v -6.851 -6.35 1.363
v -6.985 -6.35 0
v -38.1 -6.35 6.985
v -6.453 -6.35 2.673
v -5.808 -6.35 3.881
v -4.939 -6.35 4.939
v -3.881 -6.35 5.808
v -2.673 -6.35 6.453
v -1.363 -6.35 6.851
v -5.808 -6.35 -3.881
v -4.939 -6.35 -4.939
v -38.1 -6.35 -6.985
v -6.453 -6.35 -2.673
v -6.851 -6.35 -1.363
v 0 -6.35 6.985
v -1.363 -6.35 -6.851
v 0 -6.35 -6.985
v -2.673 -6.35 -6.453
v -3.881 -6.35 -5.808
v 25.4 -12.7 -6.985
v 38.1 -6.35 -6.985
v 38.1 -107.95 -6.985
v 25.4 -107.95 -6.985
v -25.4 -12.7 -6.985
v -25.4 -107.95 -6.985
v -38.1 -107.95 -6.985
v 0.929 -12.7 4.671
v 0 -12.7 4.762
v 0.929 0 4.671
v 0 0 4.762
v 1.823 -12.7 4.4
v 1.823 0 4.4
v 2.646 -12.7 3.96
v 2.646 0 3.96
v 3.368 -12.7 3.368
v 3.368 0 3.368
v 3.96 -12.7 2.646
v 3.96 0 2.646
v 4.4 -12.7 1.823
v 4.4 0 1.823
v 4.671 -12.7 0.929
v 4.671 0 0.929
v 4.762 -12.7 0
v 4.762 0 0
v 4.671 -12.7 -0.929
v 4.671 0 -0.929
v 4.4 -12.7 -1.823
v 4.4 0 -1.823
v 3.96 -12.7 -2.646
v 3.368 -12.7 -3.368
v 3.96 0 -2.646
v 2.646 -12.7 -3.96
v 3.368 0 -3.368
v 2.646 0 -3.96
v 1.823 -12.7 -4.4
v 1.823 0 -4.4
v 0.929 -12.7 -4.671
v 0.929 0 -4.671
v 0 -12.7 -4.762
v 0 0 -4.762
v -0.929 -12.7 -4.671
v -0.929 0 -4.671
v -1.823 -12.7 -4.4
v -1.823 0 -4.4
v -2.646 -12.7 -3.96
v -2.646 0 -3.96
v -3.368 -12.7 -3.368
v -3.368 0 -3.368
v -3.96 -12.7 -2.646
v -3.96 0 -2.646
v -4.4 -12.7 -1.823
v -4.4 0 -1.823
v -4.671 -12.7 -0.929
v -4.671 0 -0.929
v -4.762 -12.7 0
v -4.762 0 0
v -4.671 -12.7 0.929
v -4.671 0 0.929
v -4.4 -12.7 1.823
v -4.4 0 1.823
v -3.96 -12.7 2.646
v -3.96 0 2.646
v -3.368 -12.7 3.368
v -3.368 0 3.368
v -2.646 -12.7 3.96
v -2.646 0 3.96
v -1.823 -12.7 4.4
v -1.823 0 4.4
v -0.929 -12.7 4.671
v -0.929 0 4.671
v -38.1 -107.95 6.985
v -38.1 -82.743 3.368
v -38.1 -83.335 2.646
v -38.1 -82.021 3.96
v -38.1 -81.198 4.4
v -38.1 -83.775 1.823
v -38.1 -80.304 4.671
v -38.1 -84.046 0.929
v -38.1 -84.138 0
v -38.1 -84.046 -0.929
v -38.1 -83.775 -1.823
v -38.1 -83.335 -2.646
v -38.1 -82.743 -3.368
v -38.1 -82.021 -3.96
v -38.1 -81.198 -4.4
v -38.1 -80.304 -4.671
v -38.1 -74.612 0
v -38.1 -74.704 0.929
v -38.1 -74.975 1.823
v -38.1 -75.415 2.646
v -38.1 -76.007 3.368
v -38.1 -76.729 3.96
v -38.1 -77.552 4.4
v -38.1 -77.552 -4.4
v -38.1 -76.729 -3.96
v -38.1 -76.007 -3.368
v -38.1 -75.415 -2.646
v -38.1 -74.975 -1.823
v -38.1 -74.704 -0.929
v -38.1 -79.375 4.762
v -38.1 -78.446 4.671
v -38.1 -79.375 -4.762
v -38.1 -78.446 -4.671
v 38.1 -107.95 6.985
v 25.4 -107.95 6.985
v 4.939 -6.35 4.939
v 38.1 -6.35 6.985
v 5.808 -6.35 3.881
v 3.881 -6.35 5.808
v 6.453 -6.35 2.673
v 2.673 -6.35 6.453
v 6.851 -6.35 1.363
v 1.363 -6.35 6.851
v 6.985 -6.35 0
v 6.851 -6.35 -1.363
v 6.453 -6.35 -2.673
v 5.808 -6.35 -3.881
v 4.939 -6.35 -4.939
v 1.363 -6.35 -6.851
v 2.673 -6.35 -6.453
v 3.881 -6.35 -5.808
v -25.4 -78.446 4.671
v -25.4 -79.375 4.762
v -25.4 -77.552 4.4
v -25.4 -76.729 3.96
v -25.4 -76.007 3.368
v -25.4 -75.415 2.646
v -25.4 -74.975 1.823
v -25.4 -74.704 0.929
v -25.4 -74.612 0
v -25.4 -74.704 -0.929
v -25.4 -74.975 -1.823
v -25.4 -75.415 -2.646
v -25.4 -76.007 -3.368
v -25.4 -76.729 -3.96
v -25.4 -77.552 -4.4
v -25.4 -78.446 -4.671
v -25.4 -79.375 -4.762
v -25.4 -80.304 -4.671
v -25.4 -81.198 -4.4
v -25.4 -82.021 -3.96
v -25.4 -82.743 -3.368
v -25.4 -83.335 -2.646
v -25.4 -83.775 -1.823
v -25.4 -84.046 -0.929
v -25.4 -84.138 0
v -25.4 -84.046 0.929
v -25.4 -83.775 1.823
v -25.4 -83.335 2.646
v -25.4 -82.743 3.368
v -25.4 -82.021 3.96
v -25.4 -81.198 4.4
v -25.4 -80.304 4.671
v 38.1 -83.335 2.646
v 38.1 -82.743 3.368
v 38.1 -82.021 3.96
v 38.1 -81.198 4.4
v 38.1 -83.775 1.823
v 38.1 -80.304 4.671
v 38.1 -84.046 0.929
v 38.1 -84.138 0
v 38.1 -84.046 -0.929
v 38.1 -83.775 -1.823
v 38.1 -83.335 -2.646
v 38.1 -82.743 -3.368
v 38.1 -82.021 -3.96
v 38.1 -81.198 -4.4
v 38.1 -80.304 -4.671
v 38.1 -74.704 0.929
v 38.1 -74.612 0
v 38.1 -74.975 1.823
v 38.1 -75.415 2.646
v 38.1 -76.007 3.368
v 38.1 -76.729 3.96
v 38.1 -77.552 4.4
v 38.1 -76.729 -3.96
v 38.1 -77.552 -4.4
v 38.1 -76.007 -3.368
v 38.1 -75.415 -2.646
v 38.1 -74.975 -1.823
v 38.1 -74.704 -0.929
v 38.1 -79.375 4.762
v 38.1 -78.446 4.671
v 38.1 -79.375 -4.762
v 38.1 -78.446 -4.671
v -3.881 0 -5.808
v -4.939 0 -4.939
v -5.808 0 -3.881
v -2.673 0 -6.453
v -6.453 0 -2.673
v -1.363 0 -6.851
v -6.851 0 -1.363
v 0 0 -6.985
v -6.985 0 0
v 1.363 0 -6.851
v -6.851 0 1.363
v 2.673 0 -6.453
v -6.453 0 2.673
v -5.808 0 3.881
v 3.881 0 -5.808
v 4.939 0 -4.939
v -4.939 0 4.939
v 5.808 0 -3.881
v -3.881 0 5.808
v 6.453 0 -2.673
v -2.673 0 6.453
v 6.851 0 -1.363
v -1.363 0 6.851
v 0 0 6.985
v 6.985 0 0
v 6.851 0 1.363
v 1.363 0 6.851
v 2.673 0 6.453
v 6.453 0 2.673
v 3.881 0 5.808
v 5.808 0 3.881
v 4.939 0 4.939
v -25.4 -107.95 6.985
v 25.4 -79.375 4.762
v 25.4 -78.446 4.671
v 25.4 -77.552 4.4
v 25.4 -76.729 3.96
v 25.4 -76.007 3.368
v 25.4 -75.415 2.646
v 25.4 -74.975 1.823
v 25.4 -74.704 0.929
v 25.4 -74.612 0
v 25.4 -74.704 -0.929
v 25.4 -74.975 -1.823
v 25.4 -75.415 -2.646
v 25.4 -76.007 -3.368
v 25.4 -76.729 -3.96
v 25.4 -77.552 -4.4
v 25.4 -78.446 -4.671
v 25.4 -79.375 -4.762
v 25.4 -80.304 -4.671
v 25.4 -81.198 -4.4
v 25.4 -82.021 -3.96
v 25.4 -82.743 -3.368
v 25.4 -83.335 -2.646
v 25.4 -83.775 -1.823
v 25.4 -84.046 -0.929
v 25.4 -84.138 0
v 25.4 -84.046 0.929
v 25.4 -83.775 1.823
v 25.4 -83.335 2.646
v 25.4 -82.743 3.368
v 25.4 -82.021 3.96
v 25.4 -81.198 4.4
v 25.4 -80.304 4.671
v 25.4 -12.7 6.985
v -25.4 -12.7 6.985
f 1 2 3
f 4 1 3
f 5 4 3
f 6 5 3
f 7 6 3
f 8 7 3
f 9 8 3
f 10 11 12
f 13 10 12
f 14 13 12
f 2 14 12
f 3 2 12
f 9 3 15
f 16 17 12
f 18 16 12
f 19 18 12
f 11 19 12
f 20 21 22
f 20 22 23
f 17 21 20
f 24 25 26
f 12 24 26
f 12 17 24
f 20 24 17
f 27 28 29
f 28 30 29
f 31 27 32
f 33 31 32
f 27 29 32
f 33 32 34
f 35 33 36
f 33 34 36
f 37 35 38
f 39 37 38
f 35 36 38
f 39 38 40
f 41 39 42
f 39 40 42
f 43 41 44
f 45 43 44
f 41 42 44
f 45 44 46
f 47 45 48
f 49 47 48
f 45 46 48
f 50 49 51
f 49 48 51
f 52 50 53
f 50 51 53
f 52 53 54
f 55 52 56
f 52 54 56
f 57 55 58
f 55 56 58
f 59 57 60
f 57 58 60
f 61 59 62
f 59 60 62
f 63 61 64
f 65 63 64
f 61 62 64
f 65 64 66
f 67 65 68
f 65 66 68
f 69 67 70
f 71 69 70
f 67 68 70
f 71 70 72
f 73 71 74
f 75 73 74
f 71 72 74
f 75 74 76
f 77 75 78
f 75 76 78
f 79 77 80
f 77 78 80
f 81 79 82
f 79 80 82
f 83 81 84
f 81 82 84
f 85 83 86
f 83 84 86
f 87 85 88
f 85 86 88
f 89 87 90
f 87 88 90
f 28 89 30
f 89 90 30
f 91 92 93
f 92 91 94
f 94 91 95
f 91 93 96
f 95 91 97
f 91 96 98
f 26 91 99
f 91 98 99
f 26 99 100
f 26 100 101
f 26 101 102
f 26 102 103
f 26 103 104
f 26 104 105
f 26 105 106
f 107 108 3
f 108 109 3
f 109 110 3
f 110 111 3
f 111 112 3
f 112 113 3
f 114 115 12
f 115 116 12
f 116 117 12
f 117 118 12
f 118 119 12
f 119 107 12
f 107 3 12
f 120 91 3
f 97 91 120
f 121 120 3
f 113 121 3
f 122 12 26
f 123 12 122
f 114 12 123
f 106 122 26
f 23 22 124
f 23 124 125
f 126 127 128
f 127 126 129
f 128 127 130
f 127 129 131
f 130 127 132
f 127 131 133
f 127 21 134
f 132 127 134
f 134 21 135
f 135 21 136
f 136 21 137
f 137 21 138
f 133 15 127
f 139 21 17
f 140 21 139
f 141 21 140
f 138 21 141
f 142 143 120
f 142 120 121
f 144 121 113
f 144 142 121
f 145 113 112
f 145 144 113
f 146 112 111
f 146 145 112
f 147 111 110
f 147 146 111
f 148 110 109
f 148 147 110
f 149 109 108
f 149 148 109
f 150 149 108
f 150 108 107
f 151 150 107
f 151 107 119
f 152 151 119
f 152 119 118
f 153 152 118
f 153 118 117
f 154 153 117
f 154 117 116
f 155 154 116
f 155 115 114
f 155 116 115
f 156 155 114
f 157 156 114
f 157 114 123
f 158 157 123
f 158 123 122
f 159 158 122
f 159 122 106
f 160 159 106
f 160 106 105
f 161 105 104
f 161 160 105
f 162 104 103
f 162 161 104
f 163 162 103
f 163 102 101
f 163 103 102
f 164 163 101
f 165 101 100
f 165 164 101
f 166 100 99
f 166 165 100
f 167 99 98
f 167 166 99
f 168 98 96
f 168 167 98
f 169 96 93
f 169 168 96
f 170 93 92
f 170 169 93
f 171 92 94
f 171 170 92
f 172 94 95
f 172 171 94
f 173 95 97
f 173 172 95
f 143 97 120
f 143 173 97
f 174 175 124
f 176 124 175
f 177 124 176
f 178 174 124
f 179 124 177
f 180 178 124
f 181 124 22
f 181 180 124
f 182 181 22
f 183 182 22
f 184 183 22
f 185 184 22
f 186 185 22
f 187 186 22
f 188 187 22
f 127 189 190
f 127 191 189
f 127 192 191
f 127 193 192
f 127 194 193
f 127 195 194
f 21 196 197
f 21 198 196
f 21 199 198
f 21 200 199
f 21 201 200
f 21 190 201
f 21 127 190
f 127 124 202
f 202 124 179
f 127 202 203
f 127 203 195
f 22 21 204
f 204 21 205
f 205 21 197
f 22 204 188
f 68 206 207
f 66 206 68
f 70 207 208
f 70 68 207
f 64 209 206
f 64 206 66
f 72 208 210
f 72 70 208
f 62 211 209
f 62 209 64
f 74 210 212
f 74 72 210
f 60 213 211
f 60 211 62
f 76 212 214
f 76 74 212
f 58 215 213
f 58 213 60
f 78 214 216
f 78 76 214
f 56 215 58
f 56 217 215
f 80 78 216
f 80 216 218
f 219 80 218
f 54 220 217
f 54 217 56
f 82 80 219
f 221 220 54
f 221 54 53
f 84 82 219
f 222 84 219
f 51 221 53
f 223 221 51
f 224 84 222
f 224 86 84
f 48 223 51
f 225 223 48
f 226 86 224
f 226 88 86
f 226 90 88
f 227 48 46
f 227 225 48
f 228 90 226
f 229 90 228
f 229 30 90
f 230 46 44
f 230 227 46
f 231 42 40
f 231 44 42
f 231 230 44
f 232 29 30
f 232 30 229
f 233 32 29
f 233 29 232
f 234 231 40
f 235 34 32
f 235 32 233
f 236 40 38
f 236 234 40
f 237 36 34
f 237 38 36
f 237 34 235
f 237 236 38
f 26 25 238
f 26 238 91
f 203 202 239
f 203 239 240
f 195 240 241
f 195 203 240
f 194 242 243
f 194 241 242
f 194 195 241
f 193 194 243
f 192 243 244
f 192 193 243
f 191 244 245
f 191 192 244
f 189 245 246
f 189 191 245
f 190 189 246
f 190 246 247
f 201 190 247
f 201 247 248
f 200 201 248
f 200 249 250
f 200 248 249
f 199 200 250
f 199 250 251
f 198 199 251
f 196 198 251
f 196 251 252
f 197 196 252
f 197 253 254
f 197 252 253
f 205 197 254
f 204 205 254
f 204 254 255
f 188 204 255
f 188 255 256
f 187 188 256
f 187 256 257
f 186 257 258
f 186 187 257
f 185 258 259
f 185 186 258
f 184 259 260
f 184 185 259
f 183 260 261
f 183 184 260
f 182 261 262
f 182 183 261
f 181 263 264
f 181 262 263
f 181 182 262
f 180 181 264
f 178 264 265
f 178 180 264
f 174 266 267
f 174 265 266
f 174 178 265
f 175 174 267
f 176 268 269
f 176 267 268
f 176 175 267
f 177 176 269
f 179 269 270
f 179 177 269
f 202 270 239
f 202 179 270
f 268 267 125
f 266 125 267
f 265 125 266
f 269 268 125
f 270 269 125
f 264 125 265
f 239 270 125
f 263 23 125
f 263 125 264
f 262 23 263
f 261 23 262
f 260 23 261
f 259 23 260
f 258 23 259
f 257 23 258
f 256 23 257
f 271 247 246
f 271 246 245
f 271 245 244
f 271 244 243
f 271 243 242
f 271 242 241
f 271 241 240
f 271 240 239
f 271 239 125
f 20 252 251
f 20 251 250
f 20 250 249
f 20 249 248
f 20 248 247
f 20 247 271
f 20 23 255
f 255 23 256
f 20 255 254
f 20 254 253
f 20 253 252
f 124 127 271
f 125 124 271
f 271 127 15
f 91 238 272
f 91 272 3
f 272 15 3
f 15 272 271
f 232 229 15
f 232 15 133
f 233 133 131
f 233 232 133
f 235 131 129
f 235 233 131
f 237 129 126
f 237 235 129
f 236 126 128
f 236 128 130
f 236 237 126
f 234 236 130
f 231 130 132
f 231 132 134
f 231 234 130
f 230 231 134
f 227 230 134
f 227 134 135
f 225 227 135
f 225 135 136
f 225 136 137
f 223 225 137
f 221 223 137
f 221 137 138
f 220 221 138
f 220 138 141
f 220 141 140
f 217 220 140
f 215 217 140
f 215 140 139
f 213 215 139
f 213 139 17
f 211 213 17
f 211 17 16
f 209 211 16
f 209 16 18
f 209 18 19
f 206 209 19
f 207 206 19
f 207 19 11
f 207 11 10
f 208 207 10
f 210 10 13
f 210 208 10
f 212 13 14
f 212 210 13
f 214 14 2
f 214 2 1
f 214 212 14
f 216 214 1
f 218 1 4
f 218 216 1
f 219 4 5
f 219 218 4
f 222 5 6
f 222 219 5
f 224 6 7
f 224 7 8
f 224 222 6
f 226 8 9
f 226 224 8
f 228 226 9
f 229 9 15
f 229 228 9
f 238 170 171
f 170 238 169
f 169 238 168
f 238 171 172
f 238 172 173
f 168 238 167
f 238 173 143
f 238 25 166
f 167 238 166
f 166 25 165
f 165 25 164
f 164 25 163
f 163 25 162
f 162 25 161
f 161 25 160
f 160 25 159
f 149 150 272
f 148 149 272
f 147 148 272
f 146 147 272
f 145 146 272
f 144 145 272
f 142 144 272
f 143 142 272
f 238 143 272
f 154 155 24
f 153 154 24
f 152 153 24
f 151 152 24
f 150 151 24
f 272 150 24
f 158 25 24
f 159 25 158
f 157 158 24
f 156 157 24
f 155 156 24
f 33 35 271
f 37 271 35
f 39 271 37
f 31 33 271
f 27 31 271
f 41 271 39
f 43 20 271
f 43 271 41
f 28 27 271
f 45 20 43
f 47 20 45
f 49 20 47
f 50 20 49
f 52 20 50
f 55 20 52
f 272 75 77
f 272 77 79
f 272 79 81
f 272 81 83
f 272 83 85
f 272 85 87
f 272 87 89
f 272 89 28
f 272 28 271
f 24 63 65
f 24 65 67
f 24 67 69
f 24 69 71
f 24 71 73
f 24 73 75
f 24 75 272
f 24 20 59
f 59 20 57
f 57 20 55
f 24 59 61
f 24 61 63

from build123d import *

# Parameters (mm, degrees)
SKETCH1_R               = 6.985
BOSS_EXTRUDE1_DEPTH     = 6.35
SKETCH3_R               = 4.7625
CUT_EXTRUDE1_DEPTH      = 63.5
SKETCH5_W               = 76.2
SKETCH5_H               = 13.97
BOSS_EXTRUDE2_DEPTH     = 101.6
SKETCH6_W               = 50.8
SKETCH6_H               = 95.25
CUT_EXTRUDE2_DEPTH      = 116.325510621
SKETCH7_R               = 4.7625
CUT_EXTRUDE3_DEPTH      = 115.689156964
CUT_EXTRUDE4_DEPTH      = 126.436209784
CUT_EXTRUDE4_DEPTH_BACK = 19.05
SKETCH8_R               = 4.7625


with BuildPart() as part:
    # Sketch1 → Boss-Extrude1 (new body)
    with BuildSketch(Plane(origin=(0, 0, 0), x_dir=(1, 0, 0), z_dir=(0, 1, 0))):
        with Locations(Location((0, 0, 0), (0, 0, 270))):
            Circle(SKETCH1_R)
    extrude(amount=-BOSS_EXTRUDE1_DEPTH)

    # Sketch3 → Cut-Extrude1 (cut)
    with BuildSketch(Plane(origin=(0, 0, 0), x_dir=(1, 0, 0), z_dir=(0, 1, 0))):
        with Locations(Location((0, 0, 0), (0, 0, 270))):
            Circle(SKETCH3_R)
    extrude(amount=-CUT_EXTRUDE1_DEPTH, mode=Mode.SUBTRACT)

    # Sketch5 → Boss-Extrude2 (add)
    with BuildSketch(Plane(origin=(0, -6.35, 0), x_dir=(-1, 0, 0), z_dir=(0, -1, 0))):
        Rectangle(SKETCH5_W, SKETCH5_H)
    extrude(amount=BOSS_EXTRUDE2_DEPTH)

    # Sketch6 → Cut-Extrude2 (cut, through all)
    with BuildSketch(Plane(origin=(0, 0, -6.985), x_dir=(-1, 0, 0), z_dir=(0, 0, -1))):
        with Locations((0, -60.325)):
            Rectangle(SKETCH6_W, SKETCH6_H)
    extrude(amount=-CUT_EXTRUDE2_DEPTH, mode=Mode.SUBTRACT)

    # Sketch7 → Cut-Extrude3 (cut, through all)
    with BuildSketch(Plane(origin=(0, 0, 0), x_dir=(1, 0, 0), z_dir=(0, 1, 0))):
        with Locations(Location((0, 0, 0), (0, 0, 270))):
            Circle(SKETCH7_R)
    extrude(amount=-CUT_EXTRUDE3_DEPTH, mode=Mode.SUBTRACT)

    # Sketch8 → Cut-Extrude4 (cut, two sides: drawn at the far end of the back side and taken through both)
    with BuildSketch(Plane.ZY.offset(-25.4).offset(-CUT_EXTRUDE4_DEPTH_BACK)):
        with Locations((0, -79.375)):
            Circle(SKETCH8_R)
    extrude(amount=CUT_EXTRUDE4_DEPTH + CUT_EXTRUDE4_DEPTH_BACK, mode=Mode.SUBTRACT)


solid = part.part
